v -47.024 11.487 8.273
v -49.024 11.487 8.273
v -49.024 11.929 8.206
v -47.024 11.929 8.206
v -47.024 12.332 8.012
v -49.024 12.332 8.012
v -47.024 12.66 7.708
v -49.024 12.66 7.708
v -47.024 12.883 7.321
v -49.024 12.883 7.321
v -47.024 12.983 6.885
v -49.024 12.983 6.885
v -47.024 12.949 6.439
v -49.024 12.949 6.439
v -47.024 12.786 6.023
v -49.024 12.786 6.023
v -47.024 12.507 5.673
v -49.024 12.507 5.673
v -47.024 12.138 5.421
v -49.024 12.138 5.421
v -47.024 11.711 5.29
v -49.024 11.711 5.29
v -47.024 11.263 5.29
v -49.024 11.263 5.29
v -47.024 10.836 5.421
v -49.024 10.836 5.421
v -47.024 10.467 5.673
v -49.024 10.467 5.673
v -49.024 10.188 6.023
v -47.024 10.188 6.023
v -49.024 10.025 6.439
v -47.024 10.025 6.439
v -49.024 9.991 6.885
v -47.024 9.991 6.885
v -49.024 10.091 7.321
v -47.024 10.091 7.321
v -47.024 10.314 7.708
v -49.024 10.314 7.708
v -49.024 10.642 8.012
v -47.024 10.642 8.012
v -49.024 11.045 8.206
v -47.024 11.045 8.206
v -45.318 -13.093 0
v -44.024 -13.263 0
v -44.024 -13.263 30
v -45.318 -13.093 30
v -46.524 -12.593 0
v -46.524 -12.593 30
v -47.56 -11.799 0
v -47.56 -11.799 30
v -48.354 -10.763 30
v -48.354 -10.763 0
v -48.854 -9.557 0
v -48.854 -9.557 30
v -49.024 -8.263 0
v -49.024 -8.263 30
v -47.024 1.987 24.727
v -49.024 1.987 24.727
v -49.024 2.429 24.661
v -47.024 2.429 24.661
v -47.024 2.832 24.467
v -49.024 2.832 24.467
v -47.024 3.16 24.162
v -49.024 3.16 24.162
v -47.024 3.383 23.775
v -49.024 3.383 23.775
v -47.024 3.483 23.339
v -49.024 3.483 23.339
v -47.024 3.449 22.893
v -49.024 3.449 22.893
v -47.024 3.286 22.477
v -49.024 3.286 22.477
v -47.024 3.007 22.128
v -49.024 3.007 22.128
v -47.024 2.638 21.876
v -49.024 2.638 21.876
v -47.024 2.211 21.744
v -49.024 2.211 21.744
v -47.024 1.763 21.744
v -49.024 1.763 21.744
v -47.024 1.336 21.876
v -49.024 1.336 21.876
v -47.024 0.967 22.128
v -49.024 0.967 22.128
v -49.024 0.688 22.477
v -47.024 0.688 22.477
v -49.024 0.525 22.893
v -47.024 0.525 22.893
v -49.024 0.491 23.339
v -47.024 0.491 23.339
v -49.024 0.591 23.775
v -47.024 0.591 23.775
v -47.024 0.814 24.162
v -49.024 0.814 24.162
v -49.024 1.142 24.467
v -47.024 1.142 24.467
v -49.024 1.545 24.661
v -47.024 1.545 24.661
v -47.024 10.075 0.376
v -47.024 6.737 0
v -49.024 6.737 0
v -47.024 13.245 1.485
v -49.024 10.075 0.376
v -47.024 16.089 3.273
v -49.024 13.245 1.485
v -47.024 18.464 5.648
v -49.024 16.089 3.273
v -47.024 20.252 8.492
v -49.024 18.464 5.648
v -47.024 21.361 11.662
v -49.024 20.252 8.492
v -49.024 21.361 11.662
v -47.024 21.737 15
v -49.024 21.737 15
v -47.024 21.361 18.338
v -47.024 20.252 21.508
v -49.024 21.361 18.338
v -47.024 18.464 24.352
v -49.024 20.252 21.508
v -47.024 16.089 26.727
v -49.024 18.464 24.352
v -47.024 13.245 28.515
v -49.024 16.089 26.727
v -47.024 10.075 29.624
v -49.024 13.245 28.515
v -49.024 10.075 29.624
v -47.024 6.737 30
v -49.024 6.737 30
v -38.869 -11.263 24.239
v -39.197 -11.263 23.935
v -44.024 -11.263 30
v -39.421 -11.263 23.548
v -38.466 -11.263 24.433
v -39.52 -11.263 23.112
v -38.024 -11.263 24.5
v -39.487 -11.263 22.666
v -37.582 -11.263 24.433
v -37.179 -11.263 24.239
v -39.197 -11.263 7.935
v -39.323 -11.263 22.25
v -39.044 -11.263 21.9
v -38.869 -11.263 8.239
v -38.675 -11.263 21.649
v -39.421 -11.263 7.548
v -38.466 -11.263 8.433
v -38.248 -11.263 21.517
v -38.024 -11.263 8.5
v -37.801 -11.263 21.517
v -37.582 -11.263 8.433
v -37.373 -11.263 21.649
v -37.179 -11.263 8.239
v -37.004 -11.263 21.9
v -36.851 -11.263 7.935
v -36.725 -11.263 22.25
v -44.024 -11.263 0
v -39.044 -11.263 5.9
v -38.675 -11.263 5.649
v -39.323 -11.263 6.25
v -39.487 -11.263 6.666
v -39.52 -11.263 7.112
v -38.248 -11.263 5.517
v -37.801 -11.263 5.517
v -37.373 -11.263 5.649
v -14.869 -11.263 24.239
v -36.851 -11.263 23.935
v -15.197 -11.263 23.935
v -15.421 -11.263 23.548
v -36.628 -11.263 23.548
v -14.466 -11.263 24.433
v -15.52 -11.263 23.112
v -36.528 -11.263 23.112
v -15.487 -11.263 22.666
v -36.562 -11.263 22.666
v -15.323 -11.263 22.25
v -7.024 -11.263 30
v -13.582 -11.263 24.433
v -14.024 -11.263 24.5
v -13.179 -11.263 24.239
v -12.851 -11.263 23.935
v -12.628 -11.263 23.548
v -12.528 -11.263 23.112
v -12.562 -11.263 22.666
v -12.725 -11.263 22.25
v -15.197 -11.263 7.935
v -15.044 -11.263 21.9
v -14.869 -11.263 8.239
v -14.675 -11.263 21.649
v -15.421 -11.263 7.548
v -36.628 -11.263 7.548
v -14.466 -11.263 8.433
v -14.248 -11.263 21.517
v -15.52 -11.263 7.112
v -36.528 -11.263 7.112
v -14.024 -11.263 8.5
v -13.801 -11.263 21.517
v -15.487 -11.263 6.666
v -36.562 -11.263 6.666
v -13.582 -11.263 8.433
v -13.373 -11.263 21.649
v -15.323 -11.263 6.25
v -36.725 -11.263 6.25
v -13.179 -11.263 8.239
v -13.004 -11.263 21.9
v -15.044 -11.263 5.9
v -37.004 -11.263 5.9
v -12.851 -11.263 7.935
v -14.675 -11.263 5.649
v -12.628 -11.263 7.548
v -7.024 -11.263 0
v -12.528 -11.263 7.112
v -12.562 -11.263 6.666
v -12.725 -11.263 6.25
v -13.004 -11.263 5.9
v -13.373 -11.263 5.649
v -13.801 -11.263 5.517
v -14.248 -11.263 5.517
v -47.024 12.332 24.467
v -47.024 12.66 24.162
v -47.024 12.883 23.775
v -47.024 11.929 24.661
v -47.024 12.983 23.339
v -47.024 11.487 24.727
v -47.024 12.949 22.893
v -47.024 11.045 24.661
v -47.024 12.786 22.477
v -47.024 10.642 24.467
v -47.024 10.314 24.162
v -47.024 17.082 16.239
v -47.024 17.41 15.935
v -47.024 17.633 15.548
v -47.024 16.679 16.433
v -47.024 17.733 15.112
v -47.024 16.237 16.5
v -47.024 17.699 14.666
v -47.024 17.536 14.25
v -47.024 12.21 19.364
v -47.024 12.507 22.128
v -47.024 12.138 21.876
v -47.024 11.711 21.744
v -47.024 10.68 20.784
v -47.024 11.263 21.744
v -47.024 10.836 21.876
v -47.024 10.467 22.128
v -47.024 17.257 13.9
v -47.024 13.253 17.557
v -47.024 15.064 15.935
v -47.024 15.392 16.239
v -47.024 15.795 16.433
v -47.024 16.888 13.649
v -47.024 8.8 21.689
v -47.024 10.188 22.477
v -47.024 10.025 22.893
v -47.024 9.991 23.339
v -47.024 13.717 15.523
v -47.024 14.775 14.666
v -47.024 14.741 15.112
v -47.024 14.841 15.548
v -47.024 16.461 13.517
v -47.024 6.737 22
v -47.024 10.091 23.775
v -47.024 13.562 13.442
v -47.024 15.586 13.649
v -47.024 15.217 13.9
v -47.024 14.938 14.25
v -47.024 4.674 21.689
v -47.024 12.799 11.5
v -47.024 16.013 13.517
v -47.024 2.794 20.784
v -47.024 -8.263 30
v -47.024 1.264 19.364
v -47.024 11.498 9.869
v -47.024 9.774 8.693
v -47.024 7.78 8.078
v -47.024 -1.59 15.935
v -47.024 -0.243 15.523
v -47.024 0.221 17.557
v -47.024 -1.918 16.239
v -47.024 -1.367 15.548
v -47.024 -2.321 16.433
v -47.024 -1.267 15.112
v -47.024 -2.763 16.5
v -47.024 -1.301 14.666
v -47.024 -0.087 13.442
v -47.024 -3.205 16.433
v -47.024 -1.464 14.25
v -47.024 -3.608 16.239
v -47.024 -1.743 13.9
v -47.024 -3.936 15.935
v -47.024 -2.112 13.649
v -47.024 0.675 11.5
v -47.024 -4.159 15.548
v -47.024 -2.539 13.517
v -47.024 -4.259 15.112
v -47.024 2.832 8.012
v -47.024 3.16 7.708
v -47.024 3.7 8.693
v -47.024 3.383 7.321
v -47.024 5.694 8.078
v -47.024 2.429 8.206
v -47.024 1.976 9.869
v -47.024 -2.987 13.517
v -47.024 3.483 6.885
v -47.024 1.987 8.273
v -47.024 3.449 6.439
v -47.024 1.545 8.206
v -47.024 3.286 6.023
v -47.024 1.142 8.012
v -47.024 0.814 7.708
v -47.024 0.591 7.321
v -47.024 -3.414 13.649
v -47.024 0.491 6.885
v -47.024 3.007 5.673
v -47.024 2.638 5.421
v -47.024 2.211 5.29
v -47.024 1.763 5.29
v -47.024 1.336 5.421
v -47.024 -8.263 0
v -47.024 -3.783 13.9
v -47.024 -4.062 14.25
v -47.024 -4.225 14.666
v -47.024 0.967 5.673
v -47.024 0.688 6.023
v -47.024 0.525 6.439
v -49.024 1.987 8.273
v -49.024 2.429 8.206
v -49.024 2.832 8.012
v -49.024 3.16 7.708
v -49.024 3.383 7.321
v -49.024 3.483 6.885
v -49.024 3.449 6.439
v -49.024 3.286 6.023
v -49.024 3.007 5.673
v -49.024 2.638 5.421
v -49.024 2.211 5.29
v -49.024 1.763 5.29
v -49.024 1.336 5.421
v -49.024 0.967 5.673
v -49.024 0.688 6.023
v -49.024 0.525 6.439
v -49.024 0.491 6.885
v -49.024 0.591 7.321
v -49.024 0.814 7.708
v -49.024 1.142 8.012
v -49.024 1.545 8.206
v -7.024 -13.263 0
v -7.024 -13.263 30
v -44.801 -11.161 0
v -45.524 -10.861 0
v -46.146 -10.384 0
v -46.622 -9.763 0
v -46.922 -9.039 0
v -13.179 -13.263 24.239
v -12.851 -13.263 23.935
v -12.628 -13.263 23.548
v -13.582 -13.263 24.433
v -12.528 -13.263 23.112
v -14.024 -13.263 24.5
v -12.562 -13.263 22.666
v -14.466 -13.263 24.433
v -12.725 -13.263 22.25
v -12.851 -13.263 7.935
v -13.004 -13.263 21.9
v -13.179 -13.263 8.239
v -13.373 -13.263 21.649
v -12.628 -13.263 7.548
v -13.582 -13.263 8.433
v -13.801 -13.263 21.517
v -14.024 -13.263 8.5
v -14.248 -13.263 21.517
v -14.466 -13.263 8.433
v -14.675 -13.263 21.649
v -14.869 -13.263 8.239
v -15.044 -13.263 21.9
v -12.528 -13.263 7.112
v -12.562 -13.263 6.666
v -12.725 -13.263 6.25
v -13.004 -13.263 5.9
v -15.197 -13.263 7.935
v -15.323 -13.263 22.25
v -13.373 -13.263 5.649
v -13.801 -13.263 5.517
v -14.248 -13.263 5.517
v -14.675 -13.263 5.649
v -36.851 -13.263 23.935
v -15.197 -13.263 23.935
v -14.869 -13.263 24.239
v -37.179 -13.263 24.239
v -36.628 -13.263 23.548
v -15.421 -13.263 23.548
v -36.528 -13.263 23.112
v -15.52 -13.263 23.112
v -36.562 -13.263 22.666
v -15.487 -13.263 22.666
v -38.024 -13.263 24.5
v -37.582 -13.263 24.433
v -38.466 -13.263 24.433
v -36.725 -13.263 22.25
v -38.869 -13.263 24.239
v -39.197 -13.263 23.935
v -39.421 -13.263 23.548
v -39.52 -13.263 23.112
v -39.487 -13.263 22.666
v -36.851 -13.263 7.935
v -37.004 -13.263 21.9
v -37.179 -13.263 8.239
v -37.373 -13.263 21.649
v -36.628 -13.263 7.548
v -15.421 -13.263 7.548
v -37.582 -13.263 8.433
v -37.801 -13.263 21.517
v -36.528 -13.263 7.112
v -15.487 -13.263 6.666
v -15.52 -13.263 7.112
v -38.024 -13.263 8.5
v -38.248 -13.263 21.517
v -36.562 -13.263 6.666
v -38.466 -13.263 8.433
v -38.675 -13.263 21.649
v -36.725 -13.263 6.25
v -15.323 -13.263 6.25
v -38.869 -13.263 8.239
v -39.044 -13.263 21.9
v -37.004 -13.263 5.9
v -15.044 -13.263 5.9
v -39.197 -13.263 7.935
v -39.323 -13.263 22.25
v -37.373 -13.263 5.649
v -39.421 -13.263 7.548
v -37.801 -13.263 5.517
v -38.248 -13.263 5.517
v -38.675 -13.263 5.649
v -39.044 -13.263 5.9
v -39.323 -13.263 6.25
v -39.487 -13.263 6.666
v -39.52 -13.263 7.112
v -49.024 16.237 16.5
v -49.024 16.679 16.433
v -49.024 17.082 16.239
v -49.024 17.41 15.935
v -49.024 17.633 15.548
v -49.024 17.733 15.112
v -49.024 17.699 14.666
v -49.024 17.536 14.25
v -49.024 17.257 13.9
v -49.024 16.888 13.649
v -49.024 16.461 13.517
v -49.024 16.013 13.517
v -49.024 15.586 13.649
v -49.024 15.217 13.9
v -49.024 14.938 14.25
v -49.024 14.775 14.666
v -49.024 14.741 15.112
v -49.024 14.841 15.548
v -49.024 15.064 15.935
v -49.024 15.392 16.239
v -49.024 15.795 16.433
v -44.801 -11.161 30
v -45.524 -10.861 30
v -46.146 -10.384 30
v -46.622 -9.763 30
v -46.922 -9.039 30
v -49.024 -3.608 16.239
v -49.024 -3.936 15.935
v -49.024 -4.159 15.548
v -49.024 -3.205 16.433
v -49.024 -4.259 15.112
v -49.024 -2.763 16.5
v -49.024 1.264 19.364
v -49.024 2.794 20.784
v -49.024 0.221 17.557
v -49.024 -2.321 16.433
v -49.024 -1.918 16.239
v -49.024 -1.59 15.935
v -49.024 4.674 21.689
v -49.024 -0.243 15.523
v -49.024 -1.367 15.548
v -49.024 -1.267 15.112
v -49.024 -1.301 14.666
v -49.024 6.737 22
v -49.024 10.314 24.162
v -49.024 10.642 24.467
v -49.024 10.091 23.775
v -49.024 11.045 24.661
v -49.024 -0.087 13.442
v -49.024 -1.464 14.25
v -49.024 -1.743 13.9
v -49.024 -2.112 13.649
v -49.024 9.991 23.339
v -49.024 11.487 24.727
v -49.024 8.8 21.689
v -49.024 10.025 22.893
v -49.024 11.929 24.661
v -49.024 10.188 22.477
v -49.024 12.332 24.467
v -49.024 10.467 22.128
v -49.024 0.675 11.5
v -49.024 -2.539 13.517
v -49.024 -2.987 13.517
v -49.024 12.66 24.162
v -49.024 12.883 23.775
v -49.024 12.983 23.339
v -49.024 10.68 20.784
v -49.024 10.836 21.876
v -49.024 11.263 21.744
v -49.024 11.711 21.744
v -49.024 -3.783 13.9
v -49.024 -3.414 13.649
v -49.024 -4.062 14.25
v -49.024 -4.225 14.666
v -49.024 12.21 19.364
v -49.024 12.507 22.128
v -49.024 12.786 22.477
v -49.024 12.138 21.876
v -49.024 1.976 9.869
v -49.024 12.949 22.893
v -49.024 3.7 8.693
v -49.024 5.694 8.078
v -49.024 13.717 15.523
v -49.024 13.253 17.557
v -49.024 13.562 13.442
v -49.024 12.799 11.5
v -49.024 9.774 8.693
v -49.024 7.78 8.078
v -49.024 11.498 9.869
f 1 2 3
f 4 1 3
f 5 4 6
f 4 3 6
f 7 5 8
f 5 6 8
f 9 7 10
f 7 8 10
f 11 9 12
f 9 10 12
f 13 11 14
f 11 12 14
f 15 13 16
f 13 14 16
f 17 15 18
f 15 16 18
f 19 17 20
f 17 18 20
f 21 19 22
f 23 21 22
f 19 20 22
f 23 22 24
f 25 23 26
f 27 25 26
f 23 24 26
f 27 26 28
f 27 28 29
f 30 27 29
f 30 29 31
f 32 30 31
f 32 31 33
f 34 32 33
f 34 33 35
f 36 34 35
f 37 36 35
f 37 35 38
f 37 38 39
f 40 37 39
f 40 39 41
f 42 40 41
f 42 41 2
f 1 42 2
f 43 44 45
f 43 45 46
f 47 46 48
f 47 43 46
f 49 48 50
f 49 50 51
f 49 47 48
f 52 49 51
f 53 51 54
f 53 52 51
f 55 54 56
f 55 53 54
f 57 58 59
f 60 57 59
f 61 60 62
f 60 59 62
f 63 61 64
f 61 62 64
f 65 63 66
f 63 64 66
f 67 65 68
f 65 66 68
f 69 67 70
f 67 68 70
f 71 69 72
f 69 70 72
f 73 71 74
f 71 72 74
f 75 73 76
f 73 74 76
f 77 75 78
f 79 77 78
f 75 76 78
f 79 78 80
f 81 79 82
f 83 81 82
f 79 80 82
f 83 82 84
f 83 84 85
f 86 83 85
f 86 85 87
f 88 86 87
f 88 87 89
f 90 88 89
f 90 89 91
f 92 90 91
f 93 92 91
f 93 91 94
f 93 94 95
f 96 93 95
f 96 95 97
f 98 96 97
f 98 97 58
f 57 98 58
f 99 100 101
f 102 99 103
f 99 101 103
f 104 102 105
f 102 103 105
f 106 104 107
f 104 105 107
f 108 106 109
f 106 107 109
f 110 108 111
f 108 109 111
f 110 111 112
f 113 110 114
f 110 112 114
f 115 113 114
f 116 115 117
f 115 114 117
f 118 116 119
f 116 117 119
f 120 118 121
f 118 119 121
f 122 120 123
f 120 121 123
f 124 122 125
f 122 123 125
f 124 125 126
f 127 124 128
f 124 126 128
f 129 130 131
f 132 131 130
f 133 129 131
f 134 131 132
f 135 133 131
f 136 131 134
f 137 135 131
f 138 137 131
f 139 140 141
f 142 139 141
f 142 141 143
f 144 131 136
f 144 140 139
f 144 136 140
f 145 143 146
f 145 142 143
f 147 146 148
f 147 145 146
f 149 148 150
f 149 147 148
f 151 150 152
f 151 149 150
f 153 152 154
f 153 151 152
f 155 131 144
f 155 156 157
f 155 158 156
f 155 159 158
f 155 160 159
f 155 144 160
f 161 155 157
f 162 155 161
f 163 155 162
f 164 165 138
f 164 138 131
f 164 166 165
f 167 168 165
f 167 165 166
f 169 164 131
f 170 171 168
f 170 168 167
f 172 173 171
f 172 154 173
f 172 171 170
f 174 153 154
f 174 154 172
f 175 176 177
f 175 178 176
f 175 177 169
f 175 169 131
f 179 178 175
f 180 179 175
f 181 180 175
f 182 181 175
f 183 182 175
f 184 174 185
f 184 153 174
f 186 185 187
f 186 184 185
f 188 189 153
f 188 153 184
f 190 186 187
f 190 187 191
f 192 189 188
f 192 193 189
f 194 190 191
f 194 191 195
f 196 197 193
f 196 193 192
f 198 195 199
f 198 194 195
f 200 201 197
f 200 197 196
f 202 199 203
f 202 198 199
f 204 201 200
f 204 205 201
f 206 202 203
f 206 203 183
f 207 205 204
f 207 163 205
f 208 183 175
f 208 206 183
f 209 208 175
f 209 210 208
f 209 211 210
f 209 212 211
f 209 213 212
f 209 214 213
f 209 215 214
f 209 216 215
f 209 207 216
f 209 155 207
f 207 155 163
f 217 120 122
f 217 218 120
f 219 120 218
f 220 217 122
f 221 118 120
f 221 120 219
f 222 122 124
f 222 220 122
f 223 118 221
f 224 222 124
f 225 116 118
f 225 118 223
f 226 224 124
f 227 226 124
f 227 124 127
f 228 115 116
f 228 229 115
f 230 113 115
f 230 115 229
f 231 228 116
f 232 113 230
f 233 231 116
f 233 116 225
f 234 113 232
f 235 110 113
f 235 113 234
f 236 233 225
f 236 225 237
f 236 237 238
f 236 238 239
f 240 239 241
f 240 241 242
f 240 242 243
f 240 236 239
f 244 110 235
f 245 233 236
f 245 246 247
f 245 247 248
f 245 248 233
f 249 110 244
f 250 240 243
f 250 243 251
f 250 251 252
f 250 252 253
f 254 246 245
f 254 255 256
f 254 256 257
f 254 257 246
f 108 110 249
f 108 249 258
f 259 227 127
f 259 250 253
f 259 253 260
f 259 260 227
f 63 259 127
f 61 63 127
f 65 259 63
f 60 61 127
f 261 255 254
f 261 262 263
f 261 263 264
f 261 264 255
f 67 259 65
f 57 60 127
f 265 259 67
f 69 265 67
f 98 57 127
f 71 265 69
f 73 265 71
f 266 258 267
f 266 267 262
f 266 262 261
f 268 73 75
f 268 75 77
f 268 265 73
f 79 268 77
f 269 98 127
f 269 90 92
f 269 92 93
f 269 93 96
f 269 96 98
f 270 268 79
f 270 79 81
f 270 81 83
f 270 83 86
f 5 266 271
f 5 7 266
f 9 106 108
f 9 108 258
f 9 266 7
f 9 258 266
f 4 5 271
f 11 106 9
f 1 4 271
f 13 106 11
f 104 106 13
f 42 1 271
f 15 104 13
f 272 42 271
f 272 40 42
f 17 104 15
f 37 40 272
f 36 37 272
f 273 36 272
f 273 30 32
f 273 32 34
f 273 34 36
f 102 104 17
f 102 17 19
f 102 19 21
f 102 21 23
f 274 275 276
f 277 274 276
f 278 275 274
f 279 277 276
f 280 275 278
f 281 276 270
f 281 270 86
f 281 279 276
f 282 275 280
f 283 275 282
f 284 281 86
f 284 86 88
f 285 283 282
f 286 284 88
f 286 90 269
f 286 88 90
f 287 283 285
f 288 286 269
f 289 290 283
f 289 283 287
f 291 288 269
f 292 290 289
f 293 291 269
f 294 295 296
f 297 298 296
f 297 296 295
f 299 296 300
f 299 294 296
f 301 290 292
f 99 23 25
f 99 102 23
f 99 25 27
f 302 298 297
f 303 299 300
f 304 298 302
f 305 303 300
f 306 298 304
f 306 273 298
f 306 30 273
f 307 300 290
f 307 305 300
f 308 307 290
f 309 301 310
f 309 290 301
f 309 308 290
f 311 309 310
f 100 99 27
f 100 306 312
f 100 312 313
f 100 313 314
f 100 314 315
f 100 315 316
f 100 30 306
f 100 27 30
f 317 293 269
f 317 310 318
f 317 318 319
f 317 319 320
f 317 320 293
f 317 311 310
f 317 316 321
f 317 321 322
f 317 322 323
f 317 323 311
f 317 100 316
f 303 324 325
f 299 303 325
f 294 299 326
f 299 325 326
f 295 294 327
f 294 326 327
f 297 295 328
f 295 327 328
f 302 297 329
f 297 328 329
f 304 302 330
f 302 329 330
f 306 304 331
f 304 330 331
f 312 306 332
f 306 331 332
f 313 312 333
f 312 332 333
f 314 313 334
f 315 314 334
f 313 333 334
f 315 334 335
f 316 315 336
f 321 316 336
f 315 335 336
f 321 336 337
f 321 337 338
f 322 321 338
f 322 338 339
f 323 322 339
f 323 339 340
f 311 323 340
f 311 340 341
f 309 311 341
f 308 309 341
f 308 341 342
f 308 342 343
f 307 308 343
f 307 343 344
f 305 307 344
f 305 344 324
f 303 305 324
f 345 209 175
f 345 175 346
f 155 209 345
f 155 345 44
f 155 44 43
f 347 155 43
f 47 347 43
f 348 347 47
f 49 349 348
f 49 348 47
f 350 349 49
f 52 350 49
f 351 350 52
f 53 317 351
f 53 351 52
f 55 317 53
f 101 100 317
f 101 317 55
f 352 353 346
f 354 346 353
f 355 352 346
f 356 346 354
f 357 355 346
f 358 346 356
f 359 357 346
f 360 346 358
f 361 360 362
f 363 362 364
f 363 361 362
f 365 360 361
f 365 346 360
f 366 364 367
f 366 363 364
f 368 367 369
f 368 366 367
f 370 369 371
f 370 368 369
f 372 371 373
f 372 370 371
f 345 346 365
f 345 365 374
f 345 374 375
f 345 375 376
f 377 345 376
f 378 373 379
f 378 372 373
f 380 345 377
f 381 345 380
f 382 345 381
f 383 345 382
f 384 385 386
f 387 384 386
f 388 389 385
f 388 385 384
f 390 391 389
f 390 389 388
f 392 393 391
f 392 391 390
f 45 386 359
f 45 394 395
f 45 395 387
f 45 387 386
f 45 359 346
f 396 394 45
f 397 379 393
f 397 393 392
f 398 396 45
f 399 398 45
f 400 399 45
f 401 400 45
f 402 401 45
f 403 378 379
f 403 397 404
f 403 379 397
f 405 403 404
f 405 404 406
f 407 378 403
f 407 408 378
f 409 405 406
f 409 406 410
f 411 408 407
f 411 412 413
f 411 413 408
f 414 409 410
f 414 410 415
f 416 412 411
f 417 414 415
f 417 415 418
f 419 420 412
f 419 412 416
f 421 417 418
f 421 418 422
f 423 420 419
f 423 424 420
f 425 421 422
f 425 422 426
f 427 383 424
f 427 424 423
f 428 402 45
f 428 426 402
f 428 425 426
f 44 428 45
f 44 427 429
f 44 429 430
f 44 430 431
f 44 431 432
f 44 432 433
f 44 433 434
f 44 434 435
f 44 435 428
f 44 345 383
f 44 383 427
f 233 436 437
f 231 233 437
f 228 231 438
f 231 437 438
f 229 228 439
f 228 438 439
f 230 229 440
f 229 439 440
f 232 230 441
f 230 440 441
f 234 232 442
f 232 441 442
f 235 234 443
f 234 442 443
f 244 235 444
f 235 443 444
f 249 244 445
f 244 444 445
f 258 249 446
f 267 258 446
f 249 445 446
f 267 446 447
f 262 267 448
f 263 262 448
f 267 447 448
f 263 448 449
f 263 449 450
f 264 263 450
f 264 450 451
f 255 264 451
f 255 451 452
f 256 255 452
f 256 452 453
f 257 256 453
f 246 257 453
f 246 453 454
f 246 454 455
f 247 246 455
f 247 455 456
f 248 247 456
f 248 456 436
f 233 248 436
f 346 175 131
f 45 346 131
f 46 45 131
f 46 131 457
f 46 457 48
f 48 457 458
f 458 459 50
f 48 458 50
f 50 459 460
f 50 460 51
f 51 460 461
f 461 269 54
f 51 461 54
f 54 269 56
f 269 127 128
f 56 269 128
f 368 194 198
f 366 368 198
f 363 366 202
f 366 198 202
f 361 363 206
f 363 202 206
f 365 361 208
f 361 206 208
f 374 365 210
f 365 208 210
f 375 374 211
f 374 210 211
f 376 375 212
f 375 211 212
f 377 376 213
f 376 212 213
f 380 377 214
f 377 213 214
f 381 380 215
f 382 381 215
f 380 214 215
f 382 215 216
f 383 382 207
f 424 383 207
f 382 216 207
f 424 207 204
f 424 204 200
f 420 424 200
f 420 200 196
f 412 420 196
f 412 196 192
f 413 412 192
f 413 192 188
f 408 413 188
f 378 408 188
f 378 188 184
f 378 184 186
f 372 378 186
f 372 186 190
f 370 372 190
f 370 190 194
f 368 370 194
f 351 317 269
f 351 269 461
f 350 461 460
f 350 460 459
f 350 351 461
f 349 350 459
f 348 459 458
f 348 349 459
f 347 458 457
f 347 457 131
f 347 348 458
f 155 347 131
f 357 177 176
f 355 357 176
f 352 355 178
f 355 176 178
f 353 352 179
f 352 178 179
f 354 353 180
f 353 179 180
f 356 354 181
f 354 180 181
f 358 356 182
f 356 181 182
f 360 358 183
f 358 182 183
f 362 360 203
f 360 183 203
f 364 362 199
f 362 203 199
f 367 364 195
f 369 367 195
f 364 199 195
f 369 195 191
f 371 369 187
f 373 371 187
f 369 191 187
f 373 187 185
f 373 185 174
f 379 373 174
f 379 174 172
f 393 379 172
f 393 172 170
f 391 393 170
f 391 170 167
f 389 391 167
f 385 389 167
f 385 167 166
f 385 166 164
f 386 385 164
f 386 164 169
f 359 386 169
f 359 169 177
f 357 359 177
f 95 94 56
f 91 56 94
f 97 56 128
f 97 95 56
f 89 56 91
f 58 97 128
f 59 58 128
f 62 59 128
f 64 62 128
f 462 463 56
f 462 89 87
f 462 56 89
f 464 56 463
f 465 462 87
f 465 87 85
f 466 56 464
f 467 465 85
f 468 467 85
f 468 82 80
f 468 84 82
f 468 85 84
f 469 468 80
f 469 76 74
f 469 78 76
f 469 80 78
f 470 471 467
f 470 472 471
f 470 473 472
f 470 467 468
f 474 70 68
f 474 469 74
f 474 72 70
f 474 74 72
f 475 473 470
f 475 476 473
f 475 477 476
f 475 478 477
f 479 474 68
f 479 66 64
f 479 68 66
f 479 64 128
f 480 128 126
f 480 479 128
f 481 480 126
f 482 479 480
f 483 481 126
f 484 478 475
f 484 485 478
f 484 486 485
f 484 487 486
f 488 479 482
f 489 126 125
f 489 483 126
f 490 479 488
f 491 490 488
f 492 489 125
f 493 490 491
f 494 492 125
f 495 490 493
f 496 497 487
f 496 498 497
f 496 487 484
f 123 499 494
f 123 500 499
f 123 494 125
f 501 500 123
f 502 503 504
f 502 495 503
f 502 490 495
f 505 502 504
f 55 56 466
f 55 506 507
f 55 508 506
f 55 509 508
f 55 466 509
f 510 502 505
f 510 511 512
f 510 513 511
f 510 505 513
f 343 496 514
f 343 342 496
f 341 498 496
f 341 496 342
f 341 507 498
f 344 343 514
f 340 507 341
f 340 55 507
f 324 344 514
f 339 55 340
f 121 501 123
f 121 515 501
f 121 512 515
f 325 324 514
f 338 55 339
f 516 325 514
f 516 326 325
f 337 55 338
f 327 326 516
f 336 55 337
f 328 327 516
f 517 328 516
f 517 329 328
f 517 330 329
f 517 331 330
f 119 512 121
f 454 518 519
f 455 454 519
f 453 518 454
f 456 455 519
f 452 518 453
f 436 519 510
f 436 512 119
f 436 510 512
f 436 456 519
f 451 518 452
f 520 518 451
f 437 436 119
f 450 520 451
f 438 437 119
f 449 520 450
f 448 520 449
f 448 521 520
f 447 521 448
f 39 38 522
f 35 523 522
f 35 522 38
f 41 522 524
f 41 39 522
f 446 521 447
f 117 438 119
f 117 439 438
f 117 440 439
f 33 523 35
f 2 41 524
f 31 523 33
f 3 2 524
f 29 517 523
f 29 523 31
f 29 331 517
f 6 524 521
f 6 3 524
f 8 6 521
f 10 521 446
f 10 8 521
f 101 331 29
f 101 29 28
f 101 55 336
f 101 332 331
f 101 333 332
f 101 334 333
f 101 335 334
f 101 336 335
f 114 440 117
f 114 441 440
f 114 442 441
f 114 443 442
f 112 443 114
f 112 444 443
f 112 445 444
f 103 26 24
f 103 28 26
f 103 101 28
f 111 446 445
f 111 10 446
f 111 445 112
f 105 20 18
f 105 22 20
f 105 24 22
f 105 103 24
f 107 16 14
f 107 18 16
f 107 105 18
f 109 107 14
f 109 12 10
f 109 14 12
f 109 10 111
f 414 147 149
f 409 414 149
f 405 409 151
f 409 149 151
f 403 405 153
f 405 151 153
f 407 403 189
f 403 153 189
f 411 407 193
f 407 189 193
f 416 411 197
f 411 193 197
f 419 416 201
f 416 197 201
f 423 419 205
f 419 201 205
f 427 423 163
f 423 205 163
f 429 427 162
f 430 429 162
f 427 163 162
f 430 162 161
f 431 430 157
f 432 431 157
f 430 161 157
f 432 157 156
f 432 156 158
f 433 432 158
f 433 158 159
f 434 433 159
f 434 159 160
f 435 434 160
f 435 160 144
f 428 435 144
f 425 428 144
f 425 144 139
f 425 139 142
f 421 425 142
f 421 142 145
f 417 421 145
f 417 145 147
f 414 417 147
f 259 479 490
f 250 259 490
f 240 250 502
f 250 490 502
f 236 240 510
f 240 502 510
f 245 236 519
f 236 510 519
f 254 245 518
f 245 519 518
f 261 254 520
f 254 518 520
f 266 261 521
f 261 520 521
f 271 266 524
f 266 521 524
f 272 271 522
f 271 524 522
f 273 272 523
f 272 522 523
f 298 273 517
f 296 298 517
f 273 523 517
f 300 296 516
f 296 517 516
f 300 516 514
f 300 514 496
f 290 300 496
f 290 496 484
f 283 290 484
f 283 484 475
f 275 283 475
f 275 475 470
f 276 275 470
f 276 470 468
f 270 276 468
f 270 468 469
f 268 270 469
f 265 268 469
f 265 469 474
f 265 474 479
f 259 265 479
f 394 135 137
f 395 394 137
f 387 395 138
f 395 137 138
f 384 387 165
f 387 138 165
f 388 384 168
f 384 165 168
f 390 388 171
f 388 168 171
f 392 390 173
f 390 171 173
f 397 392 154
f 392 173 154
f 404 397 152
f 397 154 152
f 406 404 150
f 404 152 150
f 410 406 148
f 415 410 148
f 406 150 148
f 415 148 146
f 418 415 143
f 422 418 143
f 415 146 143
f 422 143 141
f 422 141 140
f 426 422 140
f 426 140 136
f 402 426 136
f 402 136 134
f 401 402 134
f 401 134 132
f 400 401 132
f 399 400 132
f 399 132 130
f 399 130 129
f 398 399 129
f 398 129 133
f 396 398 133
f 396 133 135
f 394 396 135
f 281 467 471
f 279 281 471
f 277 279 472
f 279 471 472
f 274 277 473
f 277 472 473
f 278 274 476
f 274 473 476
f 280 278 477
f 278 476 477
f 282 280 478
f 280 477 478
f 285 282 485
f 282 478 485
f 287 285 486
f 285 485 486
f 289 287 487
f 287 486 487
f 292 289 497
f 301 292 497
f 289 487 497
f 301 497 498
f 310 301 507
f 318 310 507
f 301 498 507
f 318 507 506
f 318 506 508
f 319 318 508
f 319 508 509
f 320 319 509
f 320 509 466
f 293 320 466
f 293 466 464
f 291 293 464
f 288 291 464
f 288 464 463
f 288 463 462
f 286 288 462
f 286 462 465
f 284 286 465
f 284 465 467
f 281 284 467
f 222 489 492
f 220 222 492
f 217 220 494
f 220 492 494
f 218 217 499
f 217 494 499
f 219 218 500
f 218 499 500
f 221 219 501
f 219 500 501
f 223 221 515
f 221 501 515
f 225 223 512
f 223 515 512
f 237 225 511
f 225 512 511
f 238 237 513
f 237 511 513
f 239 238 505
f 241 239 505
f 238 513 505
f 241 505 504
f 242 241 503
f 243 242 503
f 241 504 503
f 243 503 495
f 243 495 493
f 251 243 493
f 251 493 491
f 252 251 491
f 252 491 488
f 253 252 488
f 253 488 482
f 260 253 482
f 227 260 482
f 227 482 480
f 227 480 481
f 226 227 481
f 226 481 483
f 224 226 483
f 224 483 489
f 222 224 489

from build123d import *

# Parameters (mm, degrees)
SM_BASE_FLANGE_1_DEPTH = 30
SKETCH_4_R             = 7
SKETCH_4_R_2           = 1.5
CUT_EXTRUDE_1_DEPTH    = 10
SKETCH_5_R             = 1.5
CUT_EXTRUDE_2_DEPTH    = 10


# Sheet-metal steps are written as plain solids
with BuildPart() as part:
    # Sketch 1 → 基体-法兰1 (new body)
    with BuildSketch(Plane.XY):
        with BuildLine():
            Line((-47.024221453, 21.737024221), (-47.024221453, -8.262975779))
            ThreePointArc((-47.024221453, -8.262975779), (-46.145541797, -10.384296122), (-44.024221453, -11.262975779))
            Line((-44.024221453, -11.262975779), (-7.024221453, -11.262975779))
            Line((-7.024221453, -11.262975779), (-7.024221453, -13.262975779))
            Line((-7.024221453, -13.262975779), (-44.024221453, -13.262975779))
            ThreePointArc((-44.024221453, -13.262975779), (-47.559755359, -11.798509684), (-49.024221453, -8.262975779))
            Line((-49.024221453, -8.262975779), (-49.024221453, 21.737024221))
            Line((-49.024221453, 21.737024221), (-47.024221453, 21.737024221))
        make_face()
    extrude(amount=SM_BASE_FLANGE_1_DEPTH)

    # 草图4 → 切除-拉伸1 (cut)
    with BuildSketch(Plane.ZY.offset(49.024221453)):
        with Locations((15, 6.737024221)):
            Circle(SKETCH_4_R)
        with Locations((6.772758664, 11.487024221)):
            Circle(SKETCH_4_R_2)
        with Locations((6.772758664, 1.987024221)):
            Circle(SKETCH_4_R_2)
        with Locations((15, -2.762975779)):
            Circle(SKETCH_4_R_2)
        with Locations((23.227241336, 1.987024221)):
            Circle(SKETCH_4_R_2)
        with Locations((23.227241336, 11.487024221)):
            Circle(SKETCH_4_R_2)
        with Locations((15, 16.237024221)):
            Circle(SKETCH_4_R_2)
        with BuildLine():
            Line((30, 21.737024221), (15, 21.737024221))
            ThreePointArc((15, 21.737024221), (25.606601718, 17.343625939), (30, 6.737024221))
            Line((30, 6.737024221), (30, 21.737024221))
        make_face()
        with BuildLine():
            Line((0, 21.737024221), (0, 6.737024221))
            ThreePointArc((0, 6.737024221), (4.393398282, 17.343625939), (15, 21.737024221))
            Line((15, 21.737024221), (0, 21.737024221))
        make_face()
    extrude(amount=-CUT_EXTRUDE_1_DEPTH, mode=Mode.SUBTRACT)

    # 草图5 → 切除-拉伸2 (cut)
    with BuildSketch(Plane(origin=(0, -11.262975779, 0), x_dir=(1, 0, 0), z_dir=(0, 1, 0))):
        with Locations(Location((-38.024221453, -23, 0), (0, 0, 270))):
            Circle(SKETCH_5_R)
        with Locations(Location((-38.024221453, -7, 0), (0, 0, 270))):
            Circle(SKETCH_5_R)
        with Locations(Location((-14.024221453, -23, 0), (0, 0, 270))):
            Circle(SKETCH_5_R)
        with Locations(Location((-14.024221453, -7, 0), (0, 0, 270))):
            Circle(SKETCH_5_R)
    extrude(amount=-CUT_EXTRUDE_2_DEPTH, mode=Mode.SUBTRACT)


solid = part.part
